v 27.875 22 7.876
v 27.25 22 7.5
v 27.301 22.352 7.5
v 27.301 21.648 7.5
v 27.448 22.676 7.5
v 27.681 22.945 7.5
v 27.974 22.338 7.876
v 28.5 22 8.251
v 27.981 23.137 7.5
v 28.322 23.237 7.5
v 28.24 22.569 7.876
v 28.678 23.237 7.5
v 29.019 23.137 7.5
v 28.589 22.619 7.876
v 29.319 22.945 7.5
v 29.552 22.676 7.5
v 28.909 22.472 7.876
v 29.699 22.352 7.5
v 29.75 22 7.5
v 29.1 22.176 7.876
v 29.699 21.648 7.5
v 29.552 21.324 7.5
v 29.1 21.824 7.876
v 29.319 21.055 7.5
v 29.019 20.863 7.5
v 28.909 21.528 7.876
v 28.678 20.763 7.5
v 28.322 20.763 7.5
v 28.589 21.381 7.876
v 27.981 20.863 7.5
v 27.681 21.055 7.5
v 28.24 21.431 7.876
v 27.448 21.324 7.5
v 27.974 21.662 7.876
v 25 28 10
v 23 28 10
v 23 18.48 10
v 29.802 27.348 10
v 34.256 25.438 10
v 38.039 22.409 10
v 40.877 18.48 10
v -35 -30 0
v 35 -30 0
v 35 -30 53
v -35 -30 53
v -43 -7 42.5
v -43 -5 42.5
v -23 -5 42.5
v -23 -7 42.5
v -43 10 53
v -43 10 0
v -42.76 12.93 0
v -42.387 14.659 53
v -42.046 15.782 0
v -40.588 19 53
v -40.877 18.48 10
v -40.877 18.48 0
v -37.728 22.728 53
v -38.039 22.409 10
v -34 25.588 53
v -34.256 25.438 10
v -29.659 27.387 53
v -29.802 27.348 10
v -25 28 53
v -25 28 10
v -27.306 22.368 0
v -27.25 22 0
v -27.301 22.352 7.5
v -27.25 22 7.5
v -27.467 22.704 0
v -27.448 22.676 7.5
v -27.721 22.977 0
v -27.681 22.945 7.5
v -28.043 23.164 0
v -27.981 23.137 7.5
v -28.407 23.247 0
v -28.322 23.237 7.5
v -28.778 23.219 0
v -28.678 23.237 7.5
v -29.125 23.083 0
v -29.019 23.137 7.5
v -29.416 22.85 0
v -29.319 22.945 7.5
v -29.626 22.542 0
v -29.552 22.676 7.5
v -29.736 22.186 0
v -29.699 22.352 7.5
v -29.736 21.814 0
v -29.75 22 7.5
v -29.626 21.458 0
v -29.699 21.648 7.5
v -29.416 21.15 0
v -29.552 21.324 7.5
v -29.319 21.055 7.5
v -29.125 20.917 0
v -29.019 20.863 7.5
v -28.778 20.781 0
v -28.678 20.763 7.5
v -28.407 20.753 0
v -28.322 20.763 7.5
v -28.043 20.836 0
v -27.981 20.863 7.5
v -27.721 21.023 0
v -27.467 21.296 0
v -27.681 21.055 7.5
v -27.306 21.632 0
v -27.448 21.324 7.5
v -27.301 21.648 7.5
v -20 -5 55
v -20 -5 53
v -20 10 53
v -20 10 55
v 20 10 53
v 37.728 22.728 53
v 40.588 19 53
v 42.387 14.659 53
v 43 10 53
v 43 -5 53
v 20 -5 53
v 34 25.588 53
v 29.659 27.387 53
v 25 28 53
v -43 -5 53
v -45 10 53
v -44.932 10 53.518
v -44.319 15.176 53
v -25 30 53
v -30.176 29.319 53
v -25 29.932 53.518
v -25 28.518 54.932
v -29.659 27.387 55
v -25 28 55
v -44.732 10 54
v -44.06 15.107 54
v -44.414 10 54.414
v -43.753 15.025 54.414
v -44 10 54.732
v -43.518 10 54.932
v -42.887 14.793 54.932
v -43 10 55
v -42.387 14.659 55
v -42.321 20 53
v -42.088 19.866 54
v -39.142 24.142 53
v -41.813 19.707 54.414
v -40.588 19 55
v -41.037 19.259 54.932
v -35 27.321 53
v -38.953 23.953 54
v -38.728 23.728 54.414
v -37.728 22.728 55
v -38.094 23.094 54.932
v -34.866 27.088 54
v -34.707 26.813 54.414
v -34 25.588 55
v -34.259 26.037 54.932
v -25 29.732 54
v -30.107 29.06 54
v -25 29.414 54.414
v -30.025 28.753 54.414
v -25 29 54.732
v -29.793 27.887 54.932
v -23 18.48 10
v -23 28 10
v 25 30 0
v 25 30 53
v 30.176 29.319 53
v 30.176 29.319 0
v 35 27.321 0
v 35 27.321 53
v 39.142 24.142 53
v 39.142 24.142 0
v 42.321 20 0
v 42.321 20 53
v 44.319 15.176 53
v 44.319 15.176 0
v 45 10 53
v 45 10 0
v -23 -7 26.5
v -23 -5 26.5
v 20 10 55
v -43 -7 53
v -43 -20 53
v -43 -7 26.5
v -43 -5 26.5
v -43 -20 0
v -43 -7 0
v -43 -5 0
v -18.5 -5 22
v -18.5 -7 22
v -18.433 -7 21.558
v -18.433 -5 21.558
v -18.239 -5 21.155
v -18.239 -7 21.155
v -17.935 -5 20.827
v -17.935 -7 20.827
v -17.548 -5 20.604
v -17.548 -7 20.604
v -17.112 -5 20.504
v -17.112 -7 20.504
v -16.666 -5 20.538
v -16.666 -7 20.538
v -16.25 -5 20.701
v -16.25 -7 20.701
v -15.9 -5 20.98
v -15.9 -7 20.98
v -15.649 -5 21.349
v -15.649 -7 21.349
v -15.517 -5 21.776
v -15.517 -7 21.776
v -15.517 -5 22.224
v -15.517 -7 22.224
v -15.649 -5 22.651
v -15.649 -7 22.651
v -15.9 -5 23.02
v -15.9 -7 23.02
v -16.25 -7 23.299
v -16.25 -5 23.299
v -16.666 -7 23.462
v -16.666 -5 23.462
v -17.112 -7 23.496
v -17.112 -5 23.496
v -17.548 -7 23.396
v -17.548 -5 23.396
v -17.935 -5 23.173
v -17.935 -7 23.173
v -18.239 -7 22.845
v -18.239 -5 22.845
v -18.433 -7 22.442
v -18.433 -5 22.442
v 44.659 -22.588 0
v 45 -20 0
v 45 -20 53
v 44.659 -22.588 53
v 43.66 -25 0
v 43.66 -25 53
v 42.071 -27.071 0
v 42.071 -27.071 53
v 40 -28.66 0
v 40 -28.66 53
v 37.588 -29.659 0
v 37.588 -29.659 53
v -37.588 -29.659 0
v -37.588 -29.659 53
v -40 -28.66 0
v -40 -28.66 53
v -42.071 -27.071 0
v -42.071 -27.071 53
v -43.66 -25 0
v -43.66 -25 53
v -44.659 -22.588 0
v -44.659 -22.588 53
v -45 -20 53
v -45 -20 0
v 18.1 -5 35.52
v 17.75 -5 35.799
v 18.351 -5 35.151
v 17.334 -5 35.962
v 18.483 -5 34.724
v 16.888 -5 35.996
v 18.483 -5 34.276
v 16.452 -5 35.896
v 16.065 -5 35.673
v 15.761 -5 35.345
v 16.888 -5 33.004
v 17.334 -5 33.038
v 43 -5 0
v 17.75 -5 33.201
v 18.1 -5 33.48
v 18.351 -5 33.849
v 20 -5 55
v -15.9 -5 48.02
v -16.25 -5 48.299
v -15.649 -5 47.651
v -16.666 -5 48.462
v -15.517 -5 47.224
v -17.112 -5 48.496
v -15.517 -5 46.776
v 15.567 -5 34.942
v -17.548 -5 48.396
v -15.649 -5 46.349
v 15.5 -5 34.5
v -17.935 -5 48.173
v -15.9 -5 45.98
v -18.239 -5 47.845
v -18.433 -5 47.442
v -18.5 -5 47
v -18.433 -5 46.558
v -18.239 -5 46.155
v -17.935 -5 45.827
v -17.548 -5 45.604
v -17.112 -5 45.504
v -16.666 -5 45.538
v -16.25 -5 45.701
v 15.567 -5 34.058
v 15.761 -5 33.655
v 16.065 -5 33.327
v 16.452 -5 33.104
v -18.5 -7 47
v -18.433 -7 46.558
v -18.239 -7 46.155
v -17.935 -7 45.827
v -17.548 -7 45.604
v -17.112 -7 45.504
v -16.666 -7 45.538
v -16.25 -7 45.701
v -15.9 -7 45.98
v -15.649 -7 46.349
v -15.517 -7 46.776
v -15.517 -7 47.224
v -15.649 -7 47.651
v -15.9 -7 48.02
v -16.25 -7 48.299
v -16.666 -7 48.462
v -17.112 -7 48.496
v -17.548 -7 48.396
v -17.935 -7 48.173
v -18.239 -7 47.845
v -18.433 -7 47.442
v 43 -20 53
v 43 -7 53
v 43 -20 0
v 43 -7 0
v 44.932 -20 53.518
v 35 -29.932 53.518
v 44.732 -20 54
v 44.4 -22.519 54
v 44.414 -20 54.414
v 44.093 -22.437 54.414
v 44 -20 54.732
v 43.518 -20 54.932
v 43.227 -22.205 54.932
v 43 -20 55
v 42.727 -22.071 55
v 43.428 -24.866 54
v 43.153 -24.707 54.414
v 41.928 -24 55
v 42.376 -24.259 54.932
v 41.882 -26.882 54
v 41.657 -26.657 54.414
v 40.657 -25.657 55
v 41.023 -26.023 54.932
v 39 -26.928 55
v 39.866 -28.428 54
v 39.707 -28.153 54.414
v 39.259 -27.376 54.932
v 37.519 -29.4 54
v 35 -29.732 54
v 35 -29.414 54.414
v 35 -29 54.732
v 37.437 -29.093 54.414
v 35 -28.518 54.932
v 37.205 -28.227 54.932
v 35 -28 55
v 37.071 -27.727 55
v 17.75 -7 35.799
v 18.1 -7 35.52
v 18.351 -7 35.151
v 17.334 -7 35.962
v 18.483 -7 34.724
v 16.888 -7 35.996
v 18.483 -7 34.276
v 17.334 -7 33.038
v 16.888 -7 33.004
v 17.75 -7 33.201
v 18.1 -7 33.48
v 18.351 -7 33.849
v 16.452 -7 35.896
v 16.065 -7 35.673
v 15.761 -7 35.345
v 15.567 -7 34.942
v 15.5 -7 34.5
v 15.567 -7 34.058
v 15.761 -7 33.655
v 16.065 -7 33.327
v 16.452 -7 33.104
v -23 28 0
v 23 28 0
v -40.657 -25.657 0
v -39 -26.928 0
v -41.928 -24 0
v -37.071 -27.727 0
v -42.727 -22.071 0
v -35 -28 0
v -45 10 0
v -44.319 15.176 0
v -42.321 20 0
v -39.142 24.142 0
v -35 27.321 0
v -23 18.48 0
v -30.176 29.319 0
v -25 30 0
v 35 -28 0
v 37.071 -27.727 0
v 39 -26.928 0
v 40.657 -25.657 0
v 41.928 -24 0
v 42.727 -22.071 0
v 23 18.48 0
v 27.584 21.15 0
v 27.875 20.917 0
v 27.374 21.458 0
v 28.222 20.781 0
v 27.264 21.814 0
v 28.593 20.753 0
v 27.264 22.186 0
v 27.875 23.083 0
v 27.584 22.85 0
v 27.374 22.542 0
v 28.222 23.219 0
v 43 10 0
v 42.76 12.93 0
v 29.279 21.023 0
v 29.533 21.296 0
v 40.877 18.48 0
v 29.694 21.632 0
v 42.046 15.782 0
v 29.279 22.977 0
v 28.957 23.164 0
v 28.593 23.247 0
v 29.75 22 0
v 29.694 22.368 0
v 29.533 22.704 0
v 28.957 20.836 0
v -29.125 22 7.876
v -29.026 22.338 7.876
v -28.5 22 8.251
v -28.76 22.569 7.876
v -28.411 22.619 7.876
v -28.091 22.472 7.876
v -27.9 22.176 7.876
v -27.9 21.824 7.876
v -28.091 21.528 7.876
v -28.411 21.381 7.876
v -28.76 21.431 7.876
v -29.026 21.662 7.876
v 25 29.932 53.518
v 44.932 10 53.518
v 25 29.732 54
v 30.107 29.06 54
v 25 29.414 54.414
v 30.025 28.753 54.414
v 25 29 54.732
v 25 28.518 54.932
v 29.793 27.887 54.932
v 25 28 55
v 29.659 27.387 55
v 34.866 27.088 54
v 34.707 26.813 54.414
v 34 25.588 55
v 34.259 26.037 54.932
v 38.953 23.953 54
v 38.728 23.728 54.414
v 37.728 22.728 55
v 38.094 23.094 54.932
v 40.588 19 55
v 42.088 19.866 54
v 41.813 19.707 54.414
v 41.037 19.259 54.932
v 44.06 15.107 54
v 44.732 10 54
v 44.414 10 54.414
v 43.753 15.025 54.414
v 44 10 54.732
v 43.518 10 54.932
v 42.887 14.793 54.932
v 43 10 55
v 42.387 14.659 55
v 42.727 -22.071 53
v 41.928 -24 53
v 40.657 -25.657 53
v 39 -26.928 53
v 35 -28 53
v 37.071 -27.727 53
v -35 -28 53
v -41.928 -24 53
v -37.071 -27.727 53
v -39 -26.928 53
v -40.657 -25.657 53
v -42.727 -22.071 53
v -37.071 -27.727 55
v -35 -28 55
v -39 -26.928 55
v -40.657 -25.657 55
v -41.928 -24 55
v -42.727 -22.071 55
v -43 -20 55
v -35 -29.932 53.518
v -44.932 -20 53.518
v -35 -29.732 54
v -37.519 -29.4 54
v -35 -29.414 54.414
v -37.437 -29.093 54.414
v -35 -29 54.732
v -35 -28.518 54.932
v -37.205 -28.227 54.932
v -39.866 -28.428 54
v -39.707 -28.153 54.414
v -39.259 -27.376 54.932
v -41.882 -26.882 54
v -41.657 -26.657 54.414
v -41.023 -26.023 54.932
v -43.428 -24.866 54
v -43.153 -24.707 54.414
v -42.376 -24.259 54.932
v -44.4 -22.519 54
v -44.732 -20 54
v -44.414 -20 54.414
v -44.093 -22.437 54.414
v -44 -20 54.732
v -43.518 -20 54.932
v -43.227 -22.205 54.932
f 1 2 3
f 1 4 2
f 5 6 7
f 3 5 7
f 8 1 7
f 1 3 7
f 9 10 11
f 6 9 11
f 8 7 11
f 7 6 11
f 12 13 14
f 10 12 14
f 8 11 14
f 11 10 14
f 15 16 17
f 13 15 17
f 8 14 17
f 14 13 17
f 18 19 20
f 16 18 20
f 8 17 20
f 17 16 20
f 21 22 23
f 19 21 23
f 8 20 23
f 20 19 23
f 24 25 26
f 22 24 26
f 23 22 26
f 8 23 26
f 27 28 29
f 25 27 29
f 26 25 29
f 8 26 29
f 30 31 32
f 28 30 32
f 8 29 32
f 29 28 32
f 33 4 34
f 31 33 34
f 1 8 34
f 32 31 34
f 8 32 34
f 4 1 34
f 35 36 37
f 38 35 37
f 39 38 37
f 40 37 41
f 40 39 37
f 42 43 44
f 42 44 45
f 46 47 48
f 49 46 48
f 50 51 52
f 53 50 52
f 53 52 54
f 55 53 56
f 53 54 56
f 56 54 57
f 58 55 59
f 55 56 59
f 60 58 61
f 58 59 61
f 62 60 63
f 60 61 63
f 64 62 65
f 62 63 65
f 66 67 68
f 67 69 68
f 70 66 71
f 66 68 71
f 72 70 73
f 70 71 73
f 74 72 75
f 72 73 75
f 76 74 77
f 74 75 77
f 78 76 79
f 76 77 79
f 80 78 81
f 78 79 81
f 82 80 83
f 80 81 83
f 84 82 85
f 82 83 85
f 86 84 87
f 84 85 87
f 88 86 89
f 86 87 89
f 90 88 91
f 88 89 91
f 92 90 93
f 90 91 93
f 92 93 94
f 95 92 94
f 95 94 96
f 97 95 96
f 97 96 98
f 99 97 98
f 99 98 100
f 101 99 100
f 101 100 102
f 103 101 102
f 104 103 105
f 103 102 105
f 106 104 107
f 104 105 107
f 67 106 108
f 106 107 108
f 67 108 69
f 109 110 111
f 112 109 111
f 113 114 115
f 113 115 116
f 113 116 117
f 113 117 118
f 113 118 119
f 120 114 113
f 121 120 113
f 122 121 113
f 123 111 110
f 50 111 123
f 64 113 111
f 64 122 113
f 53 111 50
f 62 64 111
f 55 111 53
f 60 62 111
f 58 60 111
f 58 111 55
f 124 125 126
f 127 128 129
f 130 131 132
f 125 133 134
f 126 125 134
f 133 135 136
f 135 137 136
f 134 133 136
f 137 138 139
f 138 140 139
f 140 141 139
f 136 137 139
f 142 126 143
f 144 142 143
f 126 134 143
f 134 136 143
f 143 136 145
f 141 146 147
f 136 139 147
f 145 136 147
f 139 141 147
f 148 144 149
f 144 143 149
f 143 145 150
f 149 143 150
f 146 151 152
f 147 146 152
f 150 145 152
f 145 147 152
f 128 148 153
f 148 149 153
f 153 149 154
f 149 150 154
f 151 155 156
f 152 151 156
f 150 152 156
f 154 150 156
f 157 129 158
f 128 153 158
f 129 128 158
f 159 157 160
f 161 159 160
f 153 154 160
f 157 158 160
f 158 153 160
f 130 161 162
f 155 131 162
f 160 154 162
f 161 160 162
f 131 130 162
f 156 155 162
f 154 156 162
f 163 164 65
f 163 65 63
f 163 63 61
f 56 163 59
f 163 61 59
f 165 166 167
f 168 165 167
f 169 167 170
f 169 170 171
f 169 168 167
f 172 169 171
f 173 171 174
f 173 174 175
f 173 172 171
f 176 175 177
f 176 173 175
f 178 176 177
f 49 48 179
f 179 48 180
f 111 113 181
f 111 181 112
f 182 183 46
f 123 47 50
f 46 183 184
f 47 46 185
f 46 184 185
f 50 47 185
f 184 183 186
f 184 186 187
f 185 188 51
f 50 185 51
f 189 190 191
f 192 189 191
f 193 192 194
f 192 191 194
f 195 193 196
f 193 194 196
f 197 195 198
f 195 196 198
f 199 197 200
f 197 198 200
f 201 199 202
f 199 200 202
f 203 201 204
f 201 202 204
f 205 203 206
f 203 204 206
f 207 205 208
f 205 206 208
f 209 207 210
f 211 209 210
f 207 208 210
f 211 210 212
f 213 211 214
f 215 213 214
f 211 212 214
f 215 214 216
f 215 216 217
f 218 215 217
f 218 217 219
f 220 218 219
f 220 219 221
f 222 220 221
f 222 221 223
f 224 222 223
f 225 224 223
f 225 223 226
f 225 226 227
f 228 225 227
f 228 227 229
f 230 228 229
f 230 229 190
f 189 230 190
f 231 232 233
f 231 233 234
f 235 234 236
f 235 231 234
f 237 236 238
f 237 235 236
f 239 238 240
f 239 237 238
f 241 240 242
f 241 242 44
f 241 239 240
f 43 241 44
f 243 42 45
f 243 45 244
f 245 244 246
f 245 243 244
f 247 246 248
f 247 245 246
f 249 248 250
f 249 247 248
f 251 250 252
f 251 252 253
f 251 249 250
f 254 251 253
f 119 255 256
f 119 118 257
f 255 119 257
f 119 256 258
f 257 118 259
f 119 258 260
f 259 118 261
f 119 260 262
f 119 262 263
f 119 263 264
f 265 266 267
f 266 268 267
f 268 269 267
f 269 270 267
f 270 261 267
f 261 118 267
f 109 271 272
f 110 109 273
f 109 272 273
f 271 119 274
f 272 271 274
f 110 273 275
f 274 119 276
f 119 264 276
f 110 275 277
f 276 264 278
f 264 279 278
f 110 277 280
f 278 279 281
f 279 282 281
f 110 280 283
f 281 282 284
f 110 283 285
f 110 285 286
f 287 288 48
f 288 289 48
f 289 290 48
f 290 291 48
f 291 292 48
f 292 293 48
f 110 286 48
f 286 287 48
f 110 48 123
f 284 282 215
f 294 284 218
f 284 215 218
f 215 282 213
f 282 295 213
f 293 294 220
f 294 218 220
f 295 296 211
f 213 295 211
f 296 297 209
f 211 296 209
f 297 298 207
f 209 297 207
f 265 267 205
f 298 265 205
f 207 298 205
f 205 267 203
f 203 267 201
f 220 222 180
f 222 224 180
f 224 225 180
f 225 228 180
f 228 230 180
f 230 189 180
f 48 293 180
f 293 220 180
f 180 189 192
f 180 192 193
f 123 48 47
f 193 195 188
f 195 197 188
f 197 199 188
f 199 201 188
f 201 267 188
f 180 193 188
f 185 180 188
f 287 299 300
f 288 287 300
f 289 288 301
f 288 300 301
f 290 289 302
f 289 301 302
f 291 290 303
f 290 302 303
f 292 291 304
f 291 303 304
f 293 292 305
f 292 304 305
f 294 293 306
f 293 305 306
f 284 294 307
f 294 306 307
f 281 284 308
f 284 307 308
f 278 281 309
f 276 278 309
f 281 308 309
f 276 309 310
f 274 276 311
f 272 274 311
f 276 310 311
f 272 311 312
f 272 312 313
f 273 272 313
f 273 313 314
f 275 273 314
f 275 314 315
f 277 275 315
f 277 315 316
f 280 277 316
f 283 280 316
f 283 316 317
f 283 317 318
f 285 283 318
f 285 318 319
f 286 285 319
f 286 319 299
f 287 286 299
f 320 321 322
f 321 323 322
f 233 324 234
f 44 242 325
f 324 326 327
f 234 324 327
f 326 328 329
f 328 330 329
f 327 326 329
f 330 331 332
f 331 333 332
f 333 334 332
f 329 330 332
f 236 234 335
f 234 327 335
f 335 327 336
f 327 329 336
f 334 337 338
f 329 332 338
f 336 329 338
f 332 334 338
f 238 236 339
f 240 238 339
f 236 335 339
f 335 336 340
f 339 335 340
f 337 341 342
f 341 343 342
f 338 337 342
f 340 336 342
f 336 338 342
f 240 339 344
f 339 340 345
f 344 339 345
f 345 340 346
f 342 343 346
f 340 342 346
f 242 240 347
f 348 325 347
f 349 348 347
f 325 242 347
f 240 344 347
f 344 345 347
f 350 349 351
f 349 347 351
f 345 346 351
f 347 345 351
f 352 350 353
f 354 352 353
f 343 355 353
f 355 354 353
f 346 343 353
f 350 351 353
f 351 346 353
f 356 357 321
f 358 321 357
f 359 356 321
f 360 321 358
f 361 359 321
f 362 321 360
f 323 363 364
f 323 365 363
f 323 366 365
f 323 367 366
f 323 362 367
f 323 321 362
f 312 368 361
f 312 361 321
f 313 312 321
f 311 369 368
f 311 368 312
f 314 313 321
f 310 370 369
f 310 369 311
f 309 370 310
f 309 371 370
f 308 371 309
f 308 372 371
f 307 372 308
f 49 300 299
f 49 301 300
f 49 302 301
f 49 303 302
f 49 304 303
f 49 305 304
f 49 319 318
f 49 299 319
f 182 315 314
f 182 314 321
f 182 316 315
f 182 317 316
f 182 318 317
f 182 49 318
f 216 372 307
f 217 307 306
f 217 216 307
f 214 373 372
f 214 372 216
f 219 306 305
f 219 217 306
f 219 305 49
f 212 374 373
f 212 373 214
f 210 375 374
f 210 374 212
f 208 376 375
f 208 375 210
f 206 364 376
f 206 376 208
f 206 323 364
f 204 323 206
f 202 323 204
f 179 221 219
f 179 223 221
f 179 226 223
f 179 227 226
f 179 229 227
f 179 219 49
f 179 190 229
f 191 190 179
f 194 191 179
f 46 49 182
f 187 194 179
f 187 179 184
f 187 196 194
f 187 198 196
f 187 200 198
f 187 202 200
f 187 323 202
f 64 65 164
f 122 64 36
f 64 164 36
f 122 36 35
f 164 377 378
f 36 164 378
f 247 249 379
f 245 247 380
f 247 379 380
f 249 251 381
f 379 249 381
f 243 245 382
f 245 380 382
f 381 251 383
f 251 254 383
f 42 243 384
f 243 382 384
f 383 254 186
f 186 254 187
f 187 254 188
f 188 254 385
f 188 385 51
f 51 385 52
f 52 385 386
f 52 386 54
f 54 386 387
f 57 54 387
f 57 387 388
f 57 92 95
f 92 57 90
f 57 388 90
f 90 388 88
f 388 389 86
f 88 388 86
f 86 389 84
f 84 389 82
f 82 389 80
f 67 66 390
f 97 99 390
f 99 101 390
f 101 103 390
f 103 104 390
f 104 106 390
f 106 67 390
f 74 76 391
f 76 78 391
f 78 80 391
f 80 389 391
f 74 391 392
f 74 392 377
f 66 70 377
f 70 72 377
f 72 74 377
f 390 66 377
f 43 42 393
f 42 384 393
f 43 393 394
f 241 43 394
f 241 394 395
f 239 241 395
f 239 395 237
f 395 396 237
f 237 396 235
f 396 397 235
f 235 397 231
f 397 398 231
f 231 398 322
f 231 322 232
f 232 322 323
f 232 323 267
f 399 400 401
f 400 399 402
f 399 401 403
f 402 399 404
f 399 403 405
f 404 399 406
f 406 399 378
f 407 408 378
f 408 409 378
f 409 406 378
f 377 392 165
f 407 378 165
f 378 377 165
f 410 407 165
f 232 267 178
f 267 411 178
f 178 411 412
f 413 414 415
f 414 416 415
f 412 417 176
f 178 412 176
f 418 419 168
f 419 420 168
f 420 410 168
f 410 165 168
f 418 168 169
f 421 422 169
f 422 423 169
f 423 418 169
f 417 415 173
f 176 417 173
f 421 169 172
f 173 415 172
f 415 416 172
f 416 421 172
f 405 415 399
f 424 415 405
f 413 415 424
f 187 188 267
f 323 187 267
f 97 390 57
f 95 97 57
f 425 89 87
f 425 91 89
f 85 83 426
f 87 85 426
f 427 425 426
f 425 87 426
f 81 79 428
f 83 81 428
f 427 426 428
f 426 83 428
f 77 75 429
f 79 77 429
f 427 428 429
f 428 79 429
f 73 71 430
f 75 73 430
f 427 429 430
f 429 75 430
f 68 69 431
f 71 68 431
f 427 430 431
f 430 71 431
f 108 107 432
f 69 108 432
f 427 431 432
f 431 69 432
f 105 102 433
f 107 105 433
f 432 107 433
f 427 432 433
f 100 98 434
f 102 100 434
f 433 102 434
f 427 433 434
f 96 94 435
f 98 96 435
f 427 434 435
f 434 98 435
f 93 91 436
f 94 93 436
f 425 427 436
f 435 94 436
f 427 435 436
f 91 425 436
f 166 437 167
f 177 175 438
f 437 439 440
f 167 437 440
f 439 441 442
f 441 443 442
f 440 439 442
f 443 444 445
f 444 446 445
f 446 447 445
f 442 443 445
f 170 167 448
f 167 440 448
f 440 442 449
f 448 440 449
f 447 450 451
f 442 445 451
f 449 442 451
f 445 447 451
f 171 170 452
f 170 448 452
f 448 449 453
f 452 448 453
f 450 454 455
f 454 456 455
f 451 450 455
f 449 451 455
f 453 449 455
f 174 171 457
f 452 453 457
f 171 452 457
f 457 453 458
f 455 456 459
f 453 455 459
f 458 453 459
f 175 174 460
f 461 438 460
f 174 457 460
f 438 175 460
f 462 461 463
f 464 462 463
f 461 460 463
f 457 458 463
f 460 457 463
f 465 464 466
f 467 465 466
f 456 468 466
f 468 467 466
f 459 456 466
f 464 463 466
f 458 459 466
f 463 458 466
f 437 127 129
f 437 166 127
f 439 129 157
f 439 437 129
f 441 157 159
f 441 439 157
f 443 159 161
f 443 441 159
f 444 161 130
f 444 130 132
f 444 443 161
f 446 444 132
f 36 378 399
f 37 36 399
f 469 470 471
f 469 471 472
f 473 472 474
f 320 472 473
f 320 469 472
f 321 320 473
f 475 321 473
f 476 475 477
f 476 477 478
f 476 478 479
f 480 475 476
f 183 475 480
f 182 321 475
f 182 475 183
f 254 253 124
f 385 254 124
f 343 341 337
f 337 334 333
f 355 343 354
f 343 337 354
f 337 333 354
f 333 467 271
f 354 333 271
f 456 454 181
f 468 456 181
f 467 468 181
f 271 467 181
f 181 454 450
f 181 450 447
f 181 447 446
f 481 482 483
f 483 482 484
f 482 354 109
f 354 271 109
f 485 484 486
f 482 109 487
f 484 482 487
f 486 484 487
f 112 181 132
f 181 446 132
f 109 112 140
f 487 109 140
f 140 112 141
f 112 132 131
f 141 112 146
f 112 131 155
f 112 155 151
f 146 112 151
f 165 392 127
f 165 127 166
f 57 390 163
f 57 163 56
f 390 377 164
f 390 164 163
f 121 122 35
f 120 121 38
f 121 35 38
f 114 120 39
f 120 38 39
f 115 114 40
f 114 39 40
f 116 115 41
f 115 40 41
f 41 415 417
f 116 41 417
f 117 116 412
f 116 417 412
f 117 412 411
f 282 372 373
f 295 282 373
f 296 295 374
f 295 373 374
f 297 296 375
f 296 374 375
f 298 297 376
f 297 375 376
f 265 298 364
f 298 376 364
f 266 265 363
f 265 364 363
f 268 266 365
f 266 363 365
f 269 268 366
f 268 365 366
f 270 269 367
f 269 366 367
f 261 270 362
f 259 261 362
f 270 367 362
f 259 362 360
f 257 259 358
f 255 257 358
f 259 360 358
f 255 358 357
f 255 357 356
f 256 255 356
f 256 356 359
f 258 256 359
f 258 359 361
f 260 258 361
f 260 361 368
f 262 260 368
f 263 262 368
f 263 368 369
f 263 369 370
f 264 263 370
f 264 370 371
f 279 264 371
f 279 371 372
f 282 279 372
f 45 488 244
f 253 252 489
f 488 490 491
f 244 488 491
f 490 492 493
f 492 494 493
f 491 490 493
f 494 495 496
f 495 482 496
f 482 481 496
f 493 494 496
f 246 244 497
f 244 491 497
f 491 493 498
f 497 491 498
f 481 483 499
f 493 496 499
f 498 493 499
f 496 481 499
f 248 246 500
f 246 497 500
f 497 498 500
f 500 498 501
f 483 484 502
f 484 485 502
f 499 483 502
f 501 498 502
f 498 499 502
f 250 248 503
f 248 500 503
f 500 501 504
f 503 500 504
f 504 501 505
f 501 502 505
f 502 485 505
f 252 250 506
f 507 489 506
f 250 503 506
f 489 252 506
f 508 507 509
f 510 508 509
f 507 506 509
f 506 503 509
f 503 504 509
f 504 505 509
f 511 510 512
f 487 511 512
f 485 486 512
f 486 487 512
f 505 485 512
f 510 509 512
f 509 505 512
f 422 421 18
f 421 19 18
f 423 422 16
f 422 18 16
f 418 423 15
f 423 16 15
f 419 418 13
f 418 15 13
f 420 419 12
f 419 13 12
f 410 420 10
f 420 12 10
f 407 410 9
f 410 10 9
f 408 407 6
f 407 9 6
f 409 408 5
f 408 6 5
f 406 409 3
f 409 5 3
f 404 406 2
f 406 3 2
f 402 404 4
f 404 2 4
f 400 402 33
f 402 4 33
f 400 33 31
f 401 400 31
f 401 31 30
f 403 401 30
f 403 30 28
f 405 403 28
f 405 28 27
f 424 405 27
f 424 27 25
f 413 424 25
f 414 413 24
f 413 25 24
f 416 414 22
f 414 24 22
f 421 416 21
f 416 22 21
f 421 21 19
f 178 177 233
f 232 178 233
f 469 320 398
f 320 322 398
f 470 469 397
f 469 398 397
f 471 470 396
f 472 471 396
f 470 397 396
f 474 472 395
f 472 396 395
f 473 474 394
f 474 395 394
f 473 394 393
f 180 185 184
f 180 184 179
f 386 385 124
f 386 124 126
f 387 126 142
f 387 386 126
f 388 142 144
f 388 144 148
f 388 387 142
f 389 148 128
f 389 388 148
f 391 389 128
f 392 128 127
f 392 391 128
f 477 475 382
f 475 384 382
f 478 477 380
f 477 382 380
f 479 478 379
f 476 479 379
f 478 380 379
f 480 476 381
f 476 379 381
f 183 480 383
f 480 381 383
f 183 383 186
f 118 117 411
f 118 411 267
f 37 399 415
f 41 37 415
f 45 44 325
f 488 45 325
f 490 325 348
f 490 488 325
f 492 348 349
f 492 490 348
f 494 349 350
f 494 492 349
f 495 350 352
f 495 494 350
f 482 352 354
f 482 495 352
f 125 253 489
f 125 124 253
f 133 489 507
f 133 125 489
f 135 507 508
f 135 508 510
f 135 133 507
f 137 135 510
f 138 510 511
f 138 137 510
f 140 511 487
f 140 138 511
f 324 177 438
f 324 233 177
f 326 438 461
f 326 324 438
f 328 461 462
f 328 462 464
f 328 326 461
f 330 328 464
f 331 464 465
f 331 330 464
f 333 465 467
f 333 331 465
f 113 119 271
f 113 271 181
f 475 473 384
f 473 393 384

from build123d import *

# Parameters (mm, degrees)
BOSS_EXTRUDE1_DEPTH       = 55
SHELL1_T                  = -2
BOSS_EXTRUDE2_DEPTH       = 10
M3X0_5_TAPPED_HOLE1_D     = 2.5
M3X0_5_TAPPED_HOLE1_DEPTH = 7.5
M3X0_5_TAPPED_HOLE1_TIP   = 0.751075774
BOSS_EXTRUDE3_REACH       = 79.136
SKETCH5_W                 = 86
SKETCH5_H                 = 2
SKETCH6_W                 = 40
SKETCH6_H                 = 15
CUT_EXTRUDE1_DEPTH        = 10
F_3_0MM_DOWEL_HOLE1_D     = 3
F_3_0MM_DOWEL_HOLE1_DEPTH = 4
F_3_0MM_DOWEL_HOLE1_TIP   = 0.901290929
SKETCH9_W                 = 20
SKETCH9_H                 = 16
CUT_EXTRUDE2_DEPTH        = 2
FILLET1_R                 = 2


with BuildPart() as part:
    # Sketch1 → Boss-Extrude1 (new body)
    with BuildSketch(Plane.XY):
        with BuildLine():
            Line((-25, 30), (25, 30))
            ThreePointArc((25, 30), (39.142135624, 24.142135624), (45, 10))
            Line((45, 10), (45, -20))
            ThreePointArc((45, -20), (42.071067812, -27.071067812), (35, -30))
            Line((35, -30), (-35, -30))
            ThreePointArc((-35, -30), (-42.071067812, -27.071067812), (-45, -20))
            Line((-45, -20), (-45, 10))
            ThreePointArc((-45, 10), (-39.142135624, 24.142135624), (-25, 30))
        make_face()
    extrude(amount=BOSS_EXTRUDE1_DEPTH)

    # Shell1
    shell1_openings = [part.faces().sort_by_distance(p)[0] for p in [
        (0, -0.615524706, 0),
    ]]
    offset(amount=SHELL1_T, openings=shell1_openings, kind=Kind.INTERSECTION)

    # Sketch2 → Boss-Extrude2 (add)
    with BuildSketch(Plane(origin=(0, 0, 0), x_dir=(-1, 0, 0), z_dir=(0, 0, -1))):
        with BuildLine():
            Line((-23, 18.48), (-40.87732975, 18.48))
            ThreePointArc((-40.87732975, 18.48), (-34.256349172, 25.437616396), (-25, 28))
            Line((-25, 28), (-23, 28))
            Line((-23, 28), (-23, 18.48))
        make_face()
        with BuildLine():
            Line((23, 18.48), (40.87732975, 18.48))
            ThreePointArc((40.87732975, 18.48), (34.256349172, 25.437616396), (25, 28))
            Line((25, 28), (23, 28))
            Line((23, 28), (23, 18.48))
        make_face()
    extrude(amount=-BOSS_EXTRUDE2_DEPTH)

    # M3x0.5 Tapped Hole1
    with Locations(Plane(origin=(0, 0, 0), x_dir=(-1, 0, 0), z_dir=(0, 0, -1))):
        with Locations((-28.5, 22), (28.5, 22)):
            Hole(M3X0_5_TAPPED_HOLE1_D / 2, depth=M3X0_5_TAPPED_HOLE1_DEPTH)
            with Locations((0, 0, -(M3X0_5_TAPPED_HOLE1_DEPTH + M3X0_5_TAPPED_HOLE1_TIP / 2))):  # 118° drill point
                Cone(0, M3X0_5_TAPPED_HOLE1_D / 2, M3X0_5_TAPPED_HOLE1_TIP, mode=Mode.SUBTRACT)

    # Sketch5 → Boss-Extrude3 (add, up to next)
    with BuildSketch(Plane(origin=(0, 0, 0), x_dir=(-1, 0, 0), z_dir=(0, 0, -1)), mode=Mode.PRIVATE) as boss_extrude3_sk1:
        with Locations((0, -6)):
            Rectangle(SKETCH5_W, SKETCH5_H)
    boss_extrude3_tool1 = extrude(boss_extrude3_sk1.sketch, amount=-BOSS_EXTRUDE3_REACH, mode=Mode.PRIVATE) - part.part
    add(boss_extrude3_tool1.solids().sort_by_distance((0, -6, 0))[0])

    # Sketch6 → Cut-Extrude1 (cut)
    with BuildSketch(Plane(origin=(0, 0, 53), x_dir=(-1, 0, 0), z_dir=(0, 0, -1))):
        with Locations((0, 2.5)):
            Rectangle(SKETCH6_W, SKETCH6_H)
    extrude(amount=-CUT_EXTRUDE1_DEPTH, mode=Mode.SUBTRACT)

    # Ø3.0mm Dowel Hole1
    with Locations(Plane(origin=(0, -5, 0), x_dir=(1, 0, 0), z_dir=(0, 1, 0))):
        with Locations((-17, -47), (-17, -22), (17, -34.5)):
            Hole(F_3_0MM_DOWEL_HOLE1_D / 2, depth=F_3_0MM_DOWEL_HOLE1_DEPTH)
            with Locations((0, 0, -(F_3_0MM_DOWEL_HOLE1_DEPTH + F_3_0MM_DOWEL_HOLE1_TIP / 2))):  # 118° drill point
                Cone(0, F_3_0MM_DOWEL_HOLE1_D / 2, F_3_0MM_DOWEL_HOLE1_TIP, mode=Mode.SUBTRACT)

    # Sketch9 → Cut-Extrude2 (cut)
    with BuildSketch(Plane(origin=(0, -5, 0), x_dir=(1, 0, 0), z_dir=(0, 1, 0))):
        with Locations((-33, -34.5)):
            Rectangle(SKETCH9_W, SKETCH9_H)
    extrude(amount=-CUT_EXTRUDE2_DEPTH, mode=Mode.SUBTRACT)

    # Fillet1
    fillet1_edges = [part.edges().sort_by_distance(p)[0] for p in [
        (39.142135624, 24.142135624, 55),
        (0, 30, 55),
        (-39.142135624, 24.142135624, 55),
        (-45, -5, 55),
        (-42.071067812, -27.071067812, 55),
        (0, -30, 55),
        (42.071067812, -27.071067812, 55),
        (45, -5, 55),
    ]]
    fillet(fillet1_edges, radius=FILLET1_R)


solid = part.part
